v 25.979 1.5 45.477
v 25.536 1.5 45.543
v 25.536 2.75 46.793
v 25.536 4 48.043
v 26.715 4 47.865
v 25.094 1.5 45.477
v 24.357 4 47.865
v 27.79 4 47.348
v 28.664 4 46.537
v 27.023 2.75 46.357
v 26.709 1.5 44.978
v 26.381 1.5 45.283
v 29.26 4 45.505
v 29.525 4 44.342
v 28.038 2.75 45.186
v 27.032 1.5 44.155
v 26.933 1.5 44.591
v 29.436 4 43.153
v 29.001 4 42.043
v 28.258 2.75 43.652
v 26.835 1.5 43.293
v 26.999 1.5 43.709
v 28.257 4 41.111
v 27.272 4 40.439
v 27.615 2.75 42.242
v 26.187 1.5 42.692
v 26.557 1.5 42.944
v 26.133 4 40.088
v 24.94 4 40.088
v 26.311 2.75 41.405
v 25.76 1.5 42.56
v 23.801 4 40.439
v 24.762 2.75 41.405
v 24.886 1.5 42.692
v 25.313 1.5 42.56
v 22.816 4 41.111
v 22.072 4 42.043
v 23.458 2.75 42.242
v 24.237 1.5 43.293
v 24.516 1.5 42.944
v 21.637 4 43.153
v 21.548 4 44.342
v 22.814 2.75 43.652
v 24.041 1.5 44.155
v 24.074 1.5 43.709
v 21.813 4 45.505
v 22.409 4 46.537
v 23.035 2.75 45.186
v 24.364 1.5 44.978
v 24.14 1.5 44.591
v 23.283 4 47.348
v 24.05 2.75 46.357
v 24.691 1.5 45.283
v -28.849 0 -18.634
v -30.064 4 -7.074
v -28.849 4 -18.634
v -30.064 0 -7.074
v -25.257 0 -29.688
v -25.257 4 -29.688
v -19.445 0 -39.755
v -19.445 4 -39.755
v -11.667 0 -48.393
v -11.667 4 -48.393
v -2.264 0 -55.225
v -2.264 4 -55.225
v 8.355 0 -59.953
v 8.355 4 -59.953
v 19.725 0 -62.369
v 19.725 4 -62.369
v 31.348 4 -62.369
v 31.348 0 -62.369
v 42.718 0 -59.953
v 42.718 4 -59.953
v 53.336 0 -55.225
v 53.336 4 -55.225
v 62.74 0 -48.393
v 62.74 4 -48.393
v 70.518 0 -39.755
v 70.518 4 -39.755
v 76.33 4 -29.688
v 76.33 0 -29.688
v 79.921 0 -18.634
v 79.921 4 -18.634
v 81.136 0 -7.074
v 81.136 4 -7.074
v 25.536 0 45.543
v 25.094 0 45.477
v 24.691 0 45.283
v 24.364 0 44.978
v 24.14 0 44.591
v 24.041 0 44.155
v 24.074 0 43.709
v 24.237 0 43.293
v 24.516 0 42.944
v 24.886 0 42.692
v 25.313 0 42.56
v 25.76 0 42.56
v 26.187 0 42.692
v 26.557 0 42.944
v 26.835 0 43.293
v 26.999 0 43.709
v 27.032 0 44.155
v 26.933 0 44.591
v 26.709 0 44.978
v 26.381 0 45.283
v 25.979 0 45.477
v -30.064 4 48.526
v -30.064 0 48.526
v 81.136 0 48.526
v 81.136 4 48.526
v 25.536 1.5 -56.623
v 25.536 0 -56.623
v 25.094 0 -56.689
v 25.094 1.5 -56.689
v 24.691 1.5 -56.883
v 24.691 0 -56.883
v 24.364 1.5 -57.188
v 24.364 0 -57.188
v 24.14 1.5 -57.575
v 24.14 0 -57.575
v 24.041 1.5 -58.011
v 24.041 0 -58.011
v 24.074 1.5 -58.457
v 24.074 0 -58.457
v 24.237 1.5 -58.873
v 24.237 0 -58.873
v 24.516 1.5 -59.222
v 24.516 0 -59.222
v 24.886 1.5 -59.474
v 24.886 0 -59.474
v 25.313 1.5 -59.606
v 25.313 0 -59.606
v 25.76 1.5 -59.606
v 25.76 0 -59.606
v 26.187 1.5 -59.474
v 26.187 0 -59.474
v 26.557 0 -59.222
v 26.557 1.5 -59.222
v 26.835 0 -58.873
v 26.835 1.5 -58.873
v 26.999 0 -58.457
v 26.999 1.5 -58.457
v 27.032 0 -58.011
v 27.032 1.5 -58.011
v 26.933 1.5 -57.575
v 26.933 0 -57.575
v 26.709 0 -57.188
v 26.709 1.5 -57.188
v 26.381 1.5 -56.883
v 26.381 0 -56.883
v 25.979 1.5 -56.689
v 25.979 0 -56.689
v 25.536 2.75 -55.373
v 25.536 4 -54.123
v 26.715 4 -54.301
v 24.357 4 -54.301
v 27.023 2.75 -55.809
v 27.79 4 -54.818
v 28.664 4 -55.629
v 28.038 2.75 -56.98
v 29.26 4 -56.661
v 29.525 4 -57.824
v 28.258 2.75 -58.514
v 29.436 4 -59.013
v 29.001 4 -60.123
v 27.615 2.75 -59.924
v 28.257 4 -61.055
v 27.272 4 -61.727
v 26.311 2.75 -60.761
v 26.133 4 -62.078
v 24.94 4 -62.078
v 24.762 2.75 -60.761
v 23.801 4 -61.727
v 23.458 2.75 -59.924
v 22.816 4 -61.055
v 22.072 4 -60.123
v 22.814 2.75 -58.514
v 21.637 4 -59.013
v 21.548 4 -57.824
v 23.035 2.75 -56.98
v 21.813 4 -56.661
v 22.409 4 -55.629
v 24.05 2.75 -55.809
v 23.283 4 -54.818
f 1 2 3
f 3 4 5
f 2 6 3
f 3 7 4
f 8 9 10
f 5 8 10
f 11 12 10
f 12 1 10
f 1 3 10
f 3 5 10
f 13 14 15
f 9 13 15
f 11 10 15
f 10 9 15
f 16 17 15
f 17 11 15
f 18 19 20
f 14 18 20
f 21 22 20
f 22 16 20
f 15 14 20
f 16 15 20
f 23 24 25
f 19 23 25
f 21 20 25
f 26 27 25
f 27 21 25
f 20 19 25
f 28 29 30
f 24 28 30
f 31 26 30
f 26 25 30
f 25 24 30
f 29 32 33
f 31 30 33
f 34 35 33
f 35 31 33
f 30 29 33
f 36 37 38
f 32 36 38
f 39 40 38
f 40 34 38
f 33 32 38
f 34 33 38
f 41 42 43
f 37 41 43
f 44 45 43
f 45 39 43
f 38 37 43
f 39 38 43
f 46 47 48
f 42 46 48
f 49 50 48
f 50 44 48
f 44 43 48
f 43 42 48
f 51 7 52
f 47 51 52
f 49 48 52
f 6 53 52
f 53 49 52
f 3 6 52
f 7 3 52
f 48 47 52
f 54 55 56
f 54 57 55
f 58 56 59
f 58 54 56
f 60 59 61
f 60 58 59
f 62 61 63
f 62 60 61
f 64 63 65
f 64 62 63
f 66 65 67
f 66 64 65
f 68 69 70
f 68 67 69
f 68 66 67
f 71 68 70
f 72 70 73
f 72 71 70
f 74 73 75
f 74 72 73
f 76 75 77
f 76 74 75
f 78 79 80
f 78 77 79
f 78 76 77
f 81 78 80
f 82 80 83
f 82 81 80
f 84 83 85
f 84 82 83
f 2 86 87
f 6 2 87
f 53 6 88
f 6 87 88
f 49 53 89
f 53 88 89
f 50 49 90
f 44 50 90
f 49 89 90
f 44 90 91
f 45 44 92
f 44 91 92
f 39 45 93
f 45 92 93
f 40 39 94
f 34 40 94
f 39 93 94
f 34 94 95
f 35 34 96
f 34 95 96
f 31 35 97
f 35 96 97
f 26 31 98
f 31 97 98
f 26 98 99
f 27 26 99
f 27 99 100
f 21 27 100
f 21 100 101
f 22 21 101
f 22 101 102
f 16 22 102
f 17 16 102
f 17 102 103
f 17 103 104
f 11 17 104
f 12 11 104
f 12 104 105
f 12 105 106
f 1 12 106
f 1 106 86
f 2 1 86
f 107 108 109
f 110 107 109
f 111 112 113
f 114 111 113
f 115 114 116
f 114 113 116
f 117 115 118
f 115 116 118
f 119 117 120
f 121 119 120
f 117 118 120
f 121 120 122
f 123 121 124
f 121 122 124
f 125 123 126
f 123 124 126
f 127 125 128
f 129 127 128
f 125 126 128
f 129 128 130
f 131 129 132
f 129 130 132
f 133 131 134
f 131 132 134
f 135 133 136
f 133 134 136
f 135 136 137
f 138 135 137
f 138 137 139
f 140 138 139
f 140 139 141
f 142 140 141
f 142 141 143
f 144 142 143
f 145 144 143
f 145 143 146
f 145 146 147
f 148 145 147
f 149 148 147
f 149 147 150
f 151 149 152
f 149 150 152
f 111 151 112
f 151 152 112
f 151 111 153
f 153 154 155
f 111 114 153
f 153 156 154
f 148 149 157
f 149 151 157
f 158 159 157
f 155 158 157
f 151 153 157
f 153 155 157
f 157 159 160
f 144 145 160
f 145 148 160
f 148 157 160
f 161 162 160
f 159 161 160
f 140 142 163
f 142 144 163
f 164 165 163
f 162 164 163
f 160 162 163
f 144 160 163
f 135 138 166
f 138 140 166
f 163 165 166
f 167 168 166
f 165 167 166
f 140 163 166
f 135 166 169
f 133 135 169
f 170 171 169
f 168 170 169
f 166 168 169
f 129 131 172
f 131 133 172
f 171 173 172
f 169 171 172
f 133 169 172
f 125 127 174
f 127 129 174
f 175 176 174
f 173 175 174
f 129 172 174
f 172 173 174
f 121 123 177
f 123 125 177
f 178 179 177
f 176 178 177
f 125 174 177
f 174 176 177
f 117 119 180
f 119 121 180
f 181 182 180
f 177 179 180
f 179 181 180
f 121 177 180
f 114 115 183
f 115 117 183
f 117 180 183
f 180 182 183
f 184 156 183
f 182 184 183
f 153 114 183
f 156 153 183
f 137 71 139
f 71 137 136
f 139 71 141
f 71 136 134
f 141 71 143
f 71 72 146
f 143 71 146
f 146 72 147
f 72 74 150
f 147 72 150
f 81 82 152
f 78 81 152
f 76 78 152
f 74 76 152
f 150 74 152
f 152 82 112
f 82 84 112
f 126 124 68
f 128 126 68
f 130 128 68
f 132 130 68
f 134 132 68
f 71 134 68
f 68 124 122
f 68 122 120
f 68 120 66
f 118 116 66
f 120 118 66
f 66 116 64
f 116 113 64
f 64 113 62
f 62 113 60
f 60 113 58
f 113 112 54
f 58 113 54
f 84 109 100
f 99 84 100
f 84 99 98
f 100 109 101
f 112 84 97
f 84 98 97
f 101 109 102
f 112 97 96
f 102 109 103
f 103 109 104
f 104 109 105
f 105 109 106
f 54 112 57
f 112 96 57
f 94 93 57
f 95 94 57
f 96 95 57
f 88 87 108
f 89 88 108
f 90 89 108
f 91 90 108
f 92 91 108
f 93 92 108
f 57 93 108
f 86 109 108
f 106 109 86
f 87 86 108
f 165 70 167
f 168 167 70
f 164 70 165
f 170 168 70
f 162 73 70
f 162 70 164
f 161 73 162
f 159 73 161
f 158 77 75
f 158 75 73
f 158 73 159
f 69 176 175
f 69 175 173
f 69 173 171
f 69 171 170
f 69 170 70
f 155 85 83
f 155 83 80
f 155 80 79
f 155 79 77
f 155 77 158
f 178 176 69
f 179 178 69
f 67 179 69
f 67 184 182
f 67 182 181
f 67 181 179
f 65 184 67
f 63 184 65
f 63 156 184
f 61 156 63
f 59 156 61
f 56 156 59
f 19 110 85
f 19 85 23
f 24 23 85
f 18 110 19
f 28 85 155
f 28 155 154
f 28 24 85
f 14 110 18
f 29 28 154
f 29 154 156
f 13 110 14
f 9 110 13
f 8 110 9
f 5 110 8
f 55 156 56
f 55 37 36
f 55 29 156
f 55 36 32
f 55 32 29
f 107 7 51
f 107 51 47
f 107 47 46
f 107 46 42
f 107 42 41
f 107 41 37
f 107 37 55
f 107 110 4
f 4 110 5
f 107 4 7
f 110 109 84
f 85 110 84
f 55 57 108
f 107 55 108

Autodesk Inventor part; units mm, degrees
ref_plane "YZ Plane" through (0, 0, 0) normal (1, 0, 0) x (0, 1, 0)
ref_plane "XZ Plane" through (0, 0, 0) normal (0, 1, 0) x (-1, 0, 0)
ref_plane "XY Plane" through (0, 0, 0) normal (0, 0, 1) x (1, 0, 0)
sketch "Sketch1" plane through (0, 0, 0) normal (0, 1, 0) x (-1, 0, 0)
  line L0 (30.0636, 48.5262) -> (-81.1364, 48.5262)
  line L1 (-81.1364, 48.5262) -> (-81.1364, -7.0738)
  line L2 (-81.1364, -7.0738) -> (30.0636, -7.0738)
  line L3 (30.0636, -7.0738) -> (30.0636, 48.5262)
  arc A0 (-81.1364, -7.0738) -> (30.0636, -7.0738) centre (-25.5364, -7.0738) ccw
  point P0 (0, 0)
  dimension "d0" = 55.6
  dimension "d1" = 111.2
  dimension "d2" = 55.6
extrude "Extrusion1" add sketch "Sketch1" along normal blind 4
sketch "Sketch2" plane through (0, 4, 0) normal (0, 1, 0) x (1, 0, 0)
  line L0 (-30.0636, 7.0738) -> (-30.0636, -48.5262) projected
  line L1 (-30.0636, -48.5262) -> (81.1364, -48.5262) projected
  point P0 (0, 0)
  point P1 (25.5364, -44.0432)
  dimension "d12" = 55.6
  dimension "d13" = 4.483
hole "Hole1" at (25.5364, 4, 44.0432) direction (0, -1, 0) diameter 3 depth 5 tip angle 118 countersink diameter 8 countersink angle 90
sketch "Sketch3" plane through (0, 4, 0) normal (0, 1, 0) x (1, 0, 0)
  line L0 (-30.0636, 7.0738) -> (-30.0636, -48.5262) projected
  arc A0 (81.1364, 7.0738) -> (-30.0636, 7.0738) centre (25.5364, 7.0738) ccw projected
  point P0 (0, 0)
  point P1 (25.5364, 58.1228)
  dimension "d21" = 55.6
  dimension "d22" = 51.049
hole "Hole2" at (25.5364, 4, -58.1228) direction (0, -1, 0) diameter 3 depth 5 tip angle 118 countersink diameter 8 countersink angle 90
properties part number "base-bottom-2"
